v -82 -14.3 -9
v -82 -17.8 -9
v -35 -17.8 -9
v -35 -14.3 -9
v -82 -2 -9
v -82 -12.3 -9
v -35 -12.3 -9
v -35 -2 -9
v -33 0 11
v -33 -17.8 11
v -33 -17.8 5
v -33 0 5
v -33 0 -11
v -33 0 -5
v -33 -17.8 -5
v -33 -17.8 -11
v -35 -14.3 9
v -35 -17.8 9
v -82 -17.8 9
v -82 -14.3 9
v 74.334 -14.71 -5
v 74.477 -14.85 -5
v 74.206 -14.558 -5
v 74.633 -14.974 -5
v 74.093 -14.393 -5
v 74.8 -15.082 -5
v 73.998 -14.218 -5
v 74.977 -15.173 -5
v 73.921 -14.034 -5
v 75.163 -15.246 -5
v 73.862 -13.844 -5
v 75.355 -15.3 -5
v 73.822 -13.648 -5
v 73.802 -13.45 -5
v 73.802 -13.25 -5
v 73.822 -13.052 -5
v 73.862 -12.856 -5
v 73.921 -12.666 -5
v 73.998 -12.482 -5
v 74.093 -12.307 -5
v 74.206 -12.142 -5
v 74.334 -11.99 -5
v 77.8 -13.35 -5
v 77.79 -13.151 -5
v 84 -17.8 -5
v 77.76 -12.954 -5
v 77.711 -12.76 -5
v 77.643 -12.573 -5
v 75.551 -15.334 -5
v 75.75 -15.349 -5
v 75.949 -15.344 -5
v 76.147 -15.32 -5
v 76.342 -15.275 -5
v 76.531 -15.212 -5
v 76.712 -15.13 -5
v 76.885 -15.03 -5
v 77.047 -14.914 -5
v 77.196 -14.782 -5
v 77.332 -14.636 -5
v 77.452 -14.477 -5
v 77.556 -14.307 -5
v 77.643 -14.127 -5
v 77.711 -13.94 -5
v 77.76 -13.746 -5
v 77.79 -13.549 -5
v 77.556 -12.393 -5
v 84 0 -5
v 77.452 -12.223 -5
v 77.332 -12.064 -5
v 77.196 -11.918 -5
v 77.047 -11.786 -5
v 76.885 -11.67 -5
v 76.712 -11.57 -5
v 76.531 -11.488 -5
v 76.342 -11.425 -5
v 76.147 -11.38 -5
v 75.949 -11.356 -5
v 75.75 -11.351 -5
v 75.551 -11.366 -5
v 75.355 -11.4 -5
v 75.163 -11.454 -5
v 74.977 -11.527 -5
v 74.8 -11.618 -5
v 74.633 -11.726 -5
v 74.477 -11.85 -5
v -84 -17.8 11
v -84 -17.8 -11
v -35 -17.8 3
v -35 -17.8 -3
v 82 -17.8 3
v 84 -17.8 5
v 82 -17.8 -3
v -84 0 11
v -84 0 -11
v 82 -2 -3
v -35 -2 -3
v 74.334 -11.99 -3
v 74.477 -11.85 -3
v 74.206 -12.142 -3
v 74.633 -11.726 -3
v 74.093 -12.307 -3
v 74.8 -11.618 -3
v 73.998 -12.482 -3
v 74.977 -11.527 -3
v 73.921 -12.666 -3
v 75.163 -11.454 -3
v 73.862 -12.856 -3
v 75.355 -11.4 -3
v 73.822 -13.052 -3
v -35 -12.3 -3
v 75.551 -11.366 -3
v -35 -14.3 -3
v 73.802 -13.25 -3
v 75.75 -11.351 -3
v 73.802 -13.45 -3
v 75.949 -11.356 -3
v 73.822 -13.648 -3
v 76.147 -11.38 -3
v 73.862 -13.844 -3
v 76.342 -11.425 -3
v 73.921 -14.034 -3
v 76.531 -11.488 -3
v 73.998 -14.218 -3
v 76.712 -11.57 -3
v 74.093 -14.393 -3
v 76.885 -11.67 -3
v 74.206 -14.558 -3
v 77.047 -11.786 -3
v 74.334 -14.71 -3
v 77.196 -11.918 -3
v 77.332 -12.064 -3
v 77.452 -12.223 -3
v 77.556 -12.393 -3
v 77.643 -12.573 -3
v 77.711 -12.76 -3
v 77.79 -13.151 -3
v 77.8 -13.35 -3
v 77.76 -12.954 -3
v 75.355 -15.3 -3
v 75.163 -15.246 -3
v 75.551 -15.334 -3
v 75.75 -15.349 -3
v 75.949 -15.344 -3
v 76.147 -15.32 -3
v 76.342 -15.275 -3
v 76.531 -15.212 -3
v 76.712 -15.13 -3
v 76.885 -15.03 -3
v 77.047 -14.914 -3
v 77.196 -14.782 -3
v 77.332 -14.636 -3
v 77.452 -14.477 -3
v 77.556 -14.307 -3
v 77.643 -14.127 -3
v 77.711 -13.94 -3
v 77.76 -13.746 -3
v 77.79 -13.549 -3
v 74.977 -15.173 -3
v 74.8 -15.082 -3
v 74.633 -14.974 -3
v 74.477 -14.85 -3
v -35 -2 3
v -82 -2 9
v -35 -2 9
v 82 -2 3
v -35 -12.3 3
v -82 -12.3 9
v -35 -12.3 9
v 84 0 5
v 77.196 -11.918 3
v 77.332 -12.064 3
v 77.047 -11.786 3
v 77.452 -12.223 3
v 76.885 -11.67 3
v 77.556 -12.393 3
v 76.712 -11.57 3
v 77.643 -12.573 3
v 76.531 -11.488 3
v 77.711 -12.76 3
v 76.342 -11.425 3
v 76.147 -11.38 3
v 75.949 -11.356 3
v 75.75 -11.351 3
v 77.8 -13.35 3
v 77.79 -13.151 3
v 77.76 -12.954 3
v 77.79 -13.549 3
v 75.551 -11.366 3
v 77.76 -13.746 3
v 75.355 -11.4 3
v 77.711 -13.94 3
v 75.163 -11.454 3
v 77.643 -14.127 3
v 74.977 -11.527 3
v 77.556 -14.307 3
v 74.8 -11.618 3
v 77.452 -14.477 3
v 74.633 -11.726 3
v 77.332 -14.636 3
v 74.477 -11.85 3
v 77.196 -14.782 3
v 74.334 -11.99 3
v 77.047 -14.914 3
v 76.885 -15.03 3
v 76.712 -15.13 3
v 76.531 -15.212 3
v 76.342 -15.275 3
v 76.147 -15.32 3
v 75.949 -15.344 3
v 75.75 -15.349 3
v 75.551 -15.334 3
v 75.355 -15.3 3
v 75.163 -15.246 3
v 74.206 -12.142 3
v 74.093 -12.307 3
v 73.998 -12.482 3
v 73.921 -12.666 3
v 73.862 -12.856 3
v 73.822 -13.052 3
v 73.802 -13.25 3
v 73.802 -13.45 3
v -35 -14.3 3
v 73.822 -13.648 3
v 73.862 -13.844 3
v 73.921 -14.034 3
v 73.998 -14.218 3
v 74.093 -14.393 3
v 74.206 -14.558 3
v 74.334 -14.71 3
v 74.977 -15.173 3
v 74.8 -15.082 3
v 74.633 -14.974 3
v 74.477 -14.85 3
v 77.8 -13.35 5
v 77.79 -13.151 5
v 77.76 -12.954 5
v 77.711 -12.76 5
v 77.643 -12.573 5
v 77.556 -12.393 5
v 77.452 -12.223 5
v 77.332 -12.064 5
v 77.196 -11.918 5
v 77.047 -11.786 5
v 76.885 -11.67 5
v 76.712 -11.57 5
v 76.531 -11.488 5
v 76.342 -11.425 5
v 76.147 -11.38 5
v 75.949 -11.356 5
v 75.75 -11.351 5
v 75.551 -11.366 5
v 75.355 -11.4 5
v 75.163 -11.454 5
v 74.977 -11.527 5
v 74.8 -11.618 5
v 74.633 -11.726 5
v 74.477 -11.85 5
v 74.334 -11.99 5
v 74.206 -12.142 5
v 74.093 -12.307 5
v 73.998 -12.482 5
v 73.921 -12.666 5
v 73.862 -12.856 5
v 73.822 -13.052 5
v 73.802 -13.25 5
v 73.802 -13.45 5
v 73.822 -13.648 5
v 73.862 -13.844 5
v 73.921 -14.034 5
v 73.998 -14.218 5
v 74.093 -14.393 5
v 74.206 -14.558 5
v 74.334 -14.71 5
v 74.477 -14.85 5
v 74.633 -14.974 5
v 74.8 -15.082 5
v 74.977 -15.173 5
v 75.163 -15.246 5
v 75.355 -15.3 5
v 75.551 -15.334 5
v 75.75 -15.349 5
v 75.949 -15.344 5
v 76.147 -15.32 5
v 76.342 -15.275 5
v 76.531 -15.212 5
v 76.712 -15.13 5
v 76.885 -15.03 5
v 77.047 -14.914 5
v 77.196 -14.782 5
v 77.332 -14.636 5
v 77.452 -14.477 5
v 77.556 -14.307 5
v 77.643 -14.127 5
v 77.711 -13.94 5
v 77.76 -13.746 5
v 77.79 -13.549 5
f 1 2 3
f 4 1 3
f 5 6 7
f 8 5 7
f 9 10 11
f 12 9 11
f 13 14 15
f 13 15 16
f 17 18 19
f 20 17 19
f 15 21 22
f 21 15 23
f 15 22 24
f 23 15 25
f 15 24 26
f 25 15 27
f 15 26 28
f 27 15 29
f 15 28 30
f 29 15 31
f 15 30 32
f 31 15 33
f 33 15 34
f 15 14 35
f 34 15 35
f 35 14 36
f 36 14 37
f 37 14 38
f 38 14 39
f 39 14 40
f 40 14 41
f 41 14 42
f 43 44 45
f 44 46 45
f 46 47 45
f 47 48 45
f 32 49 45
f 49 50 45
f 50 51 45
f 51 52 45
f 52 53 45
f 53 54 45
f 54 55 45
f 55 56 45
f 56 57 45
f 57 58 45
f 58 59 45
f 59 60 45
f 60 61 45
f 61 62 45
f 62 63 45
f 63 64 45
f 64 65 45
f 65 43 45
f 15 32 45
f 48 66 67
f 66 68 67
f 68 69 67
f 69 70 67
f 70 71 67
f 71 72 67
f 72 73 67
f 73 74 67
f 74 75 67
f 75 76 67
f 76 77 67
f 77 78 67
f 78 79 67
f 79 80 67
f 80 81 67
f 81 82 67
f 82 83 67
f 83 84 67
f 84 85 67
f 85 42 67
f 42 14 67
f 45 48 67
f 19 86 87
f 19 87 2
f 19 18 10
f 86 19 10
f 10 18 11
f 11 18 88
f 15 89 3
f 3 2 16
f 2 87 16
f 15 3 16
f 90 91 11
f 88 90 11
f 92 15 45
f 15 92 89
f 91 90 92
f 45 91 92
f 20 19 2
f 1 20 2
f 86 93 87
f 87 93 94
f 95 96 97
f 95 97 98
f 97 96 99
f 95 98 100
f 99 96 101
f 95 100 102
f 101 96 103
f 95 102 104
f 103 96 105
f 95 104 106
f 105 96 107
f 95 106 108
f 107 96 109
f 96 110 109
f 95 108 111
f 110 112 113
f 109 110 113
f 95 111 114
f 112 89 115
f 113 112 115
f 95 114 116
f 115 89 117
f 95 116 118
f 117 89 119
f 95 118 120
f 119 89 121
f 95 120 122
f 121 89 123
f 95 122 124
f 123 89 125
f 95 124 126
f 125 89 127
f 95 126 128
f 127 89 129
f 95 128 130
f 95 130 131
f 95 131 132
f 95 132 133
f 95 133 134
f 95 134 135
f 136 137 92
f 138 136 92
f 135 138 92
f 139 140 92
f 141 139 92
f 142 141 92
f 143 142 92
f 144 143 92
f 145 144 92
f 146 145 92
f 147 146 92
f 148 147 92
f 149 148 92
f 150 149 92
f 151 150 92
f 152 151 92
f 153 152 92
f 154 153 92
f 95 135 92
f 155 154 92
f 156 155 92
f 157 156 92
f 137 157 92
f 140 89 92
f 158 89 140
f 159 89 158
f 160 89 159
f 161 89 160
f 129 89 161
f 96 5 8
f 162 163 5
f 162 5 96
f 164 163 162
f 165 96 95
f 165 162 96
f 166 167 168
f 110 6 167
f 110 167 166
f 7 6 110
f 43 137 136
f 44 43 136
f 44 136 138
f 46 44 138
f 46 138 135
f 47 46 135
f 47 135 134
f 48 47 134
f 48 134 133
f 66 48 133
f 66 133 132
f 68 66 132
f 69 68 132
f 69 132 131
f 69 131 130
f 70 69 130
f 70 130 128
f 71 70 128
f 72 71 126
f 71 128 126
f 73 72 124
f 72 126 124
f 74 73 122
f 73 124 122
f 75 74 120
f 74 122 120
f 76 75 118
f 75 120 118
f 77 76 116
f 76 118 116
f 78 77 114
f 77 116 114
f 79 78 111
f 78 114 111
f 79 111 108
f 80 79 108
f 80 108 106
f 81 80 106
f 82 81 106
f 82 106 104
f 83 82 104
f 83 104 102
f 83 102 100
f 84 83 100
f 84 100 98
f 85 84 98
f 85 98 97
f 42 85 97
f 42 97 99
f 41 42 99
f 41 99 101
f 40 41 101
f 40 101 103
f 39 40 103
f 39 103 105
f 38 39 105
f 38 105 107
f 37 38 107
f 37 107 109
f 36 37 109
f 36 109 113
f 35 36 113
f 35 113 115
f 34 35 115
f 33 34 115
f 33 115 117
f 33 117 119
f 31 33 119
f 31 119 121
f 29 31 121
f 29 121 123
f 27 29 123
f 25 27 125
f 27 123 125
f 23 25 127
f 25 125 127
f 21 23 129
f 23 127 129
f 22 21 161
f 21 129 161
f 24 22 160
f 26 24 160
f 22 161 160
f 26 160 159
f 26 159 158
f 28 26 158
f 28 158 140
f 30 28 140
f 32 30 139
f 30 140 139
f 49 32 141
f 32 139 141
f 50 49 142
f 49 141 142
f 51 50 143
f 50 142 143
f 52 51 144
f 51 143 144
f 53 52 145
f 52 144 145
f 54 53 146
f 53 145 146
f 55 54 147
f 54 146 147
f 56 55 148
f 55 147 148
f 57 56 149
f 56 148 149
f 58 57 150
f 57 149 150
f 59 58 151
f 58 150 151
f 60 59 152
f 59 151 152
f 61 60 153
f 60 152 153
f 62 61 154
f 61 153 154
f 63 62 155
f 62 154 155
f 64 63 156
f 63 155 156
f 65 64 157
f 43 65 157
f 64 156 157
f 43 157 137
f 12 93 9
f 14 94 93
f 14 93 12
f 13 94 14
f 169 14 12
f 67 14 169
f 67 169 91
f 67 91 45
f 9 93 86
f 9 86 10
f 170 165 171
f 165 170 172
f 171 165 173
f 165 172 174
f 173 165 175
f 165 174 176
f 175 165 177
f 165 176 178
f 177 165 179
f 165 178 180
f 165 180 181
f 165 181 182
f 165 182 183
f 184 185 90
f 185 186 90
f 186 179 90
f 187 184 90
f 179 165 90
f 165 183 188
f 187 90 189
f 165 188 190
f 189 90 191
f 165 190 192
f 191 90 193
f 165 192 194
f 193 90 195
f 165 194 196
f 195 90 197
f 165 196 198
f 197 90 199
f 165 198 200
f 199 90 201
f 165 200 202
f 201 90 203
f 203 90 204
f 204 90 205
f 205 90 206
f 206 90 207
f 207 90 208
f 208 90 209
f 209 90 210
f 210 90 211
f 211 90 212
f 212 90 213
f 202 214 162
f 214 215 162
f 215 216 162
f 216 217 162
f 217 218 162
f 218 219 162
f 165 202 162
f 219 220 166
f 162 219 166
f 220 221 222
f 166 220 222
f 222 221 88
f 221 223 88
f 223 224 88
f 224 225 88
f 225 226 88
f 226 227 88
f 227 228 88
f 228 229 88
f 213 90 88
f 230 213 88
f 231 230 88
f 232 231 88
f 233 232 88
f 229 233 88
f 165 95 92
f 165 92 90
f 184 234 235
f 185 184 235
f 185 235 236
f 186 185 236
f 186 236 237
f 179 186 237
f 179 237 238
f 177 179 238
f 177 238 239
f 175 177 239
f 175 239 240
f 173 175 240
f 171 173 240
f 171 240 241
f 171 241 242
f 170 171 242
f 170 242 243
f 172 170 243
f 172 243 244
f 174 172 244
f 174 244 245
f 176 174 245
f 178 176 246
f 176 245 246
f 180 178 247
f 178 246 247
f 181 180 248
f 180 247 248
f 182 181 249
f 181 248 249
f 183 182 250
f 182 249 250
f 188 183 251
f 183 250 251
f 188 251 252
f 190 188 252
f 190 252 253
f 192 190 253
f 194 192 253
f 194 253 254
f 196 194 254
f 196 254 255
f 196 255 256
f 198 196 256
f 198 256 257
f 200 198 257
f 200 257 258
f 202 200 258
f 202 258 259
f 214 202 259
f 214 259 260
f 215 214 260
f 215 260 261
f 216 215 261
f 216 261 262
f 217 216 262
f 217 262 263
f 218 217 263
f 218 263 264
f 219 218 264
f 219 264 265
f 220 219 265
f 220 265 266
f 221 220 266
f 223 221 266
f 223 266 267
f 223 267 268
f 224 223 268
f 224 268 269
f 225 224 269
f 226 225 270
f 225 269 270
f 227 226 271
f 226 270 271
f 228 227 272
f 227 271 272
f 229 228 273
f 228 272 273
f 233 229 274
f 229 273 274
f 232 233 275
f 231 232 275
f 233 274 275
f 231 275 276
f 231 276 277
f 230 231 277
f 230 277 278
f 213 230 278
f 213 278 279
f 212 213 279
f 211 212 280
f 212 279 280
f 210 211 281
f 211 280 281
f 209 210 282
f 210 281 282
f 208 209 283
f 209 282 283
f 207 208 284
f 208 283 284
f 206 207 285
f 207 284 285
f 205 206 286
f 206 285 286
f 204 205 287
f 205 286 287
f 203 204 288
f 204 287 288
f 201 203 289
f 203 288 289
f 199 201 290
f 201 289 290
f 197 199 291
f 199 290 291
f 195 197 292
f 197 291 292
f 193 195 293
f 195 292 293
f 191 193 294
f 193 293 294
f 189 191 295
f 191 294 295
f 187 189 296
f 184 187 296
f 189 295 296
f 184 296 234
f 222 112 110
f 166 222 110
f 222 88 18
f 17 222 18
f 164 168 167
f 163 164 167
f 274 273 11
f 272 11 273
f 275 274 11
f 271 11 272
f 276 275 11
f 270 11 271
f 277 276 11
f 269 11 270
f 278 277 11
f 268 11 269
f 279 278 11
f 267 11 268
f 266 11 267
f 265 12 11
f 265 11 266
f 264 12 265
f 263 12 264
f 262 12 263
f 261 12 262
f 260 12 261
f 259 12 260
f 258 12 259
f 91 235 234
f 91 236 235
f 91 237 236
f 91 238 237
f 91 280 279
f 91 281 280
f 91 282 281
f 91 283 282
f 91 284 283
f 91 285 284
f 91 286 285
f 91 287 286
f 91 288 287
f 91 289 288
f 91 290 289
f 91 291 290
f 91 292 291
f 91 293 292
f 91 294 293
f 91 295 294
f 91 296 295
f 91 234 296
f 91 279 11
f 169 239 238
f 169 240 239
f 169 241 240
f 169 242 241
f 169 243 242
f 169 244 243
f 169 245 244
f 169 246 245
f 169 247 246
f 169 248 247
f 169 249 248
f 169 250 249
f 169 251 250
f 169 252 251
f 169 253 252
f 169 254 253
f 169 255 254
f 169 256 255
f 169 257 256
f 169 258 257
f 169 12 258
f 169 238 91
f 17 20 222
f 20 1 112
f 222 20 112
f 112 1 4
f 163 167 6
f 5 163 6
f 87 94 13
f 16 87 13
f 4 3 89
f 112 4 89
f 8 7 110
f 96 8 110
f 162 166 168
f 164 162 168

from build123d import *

# Parameters (mm, degrees)
SKETCH1_W           = 168
SKETCH1_H           = 22
BOSS_EXTRUDE1_DEPTH = 17.8
SKETCH8_R           = 2
CUT_EXTRUDE4_DEPTH  = 22
CUT_EXTRUDE2_REACH  = 88.567
SKETCH5_W           = 117
SKETCH5_H           = 6
CUT_EXTRUDE3_DEPTH  = 15.8
BOSS_EXTRUDE3_REACH = 90.164
SKETCH7_W           = 47
SKETCH7_H           = 2


with BuildPart() as part:
    # Sketch1 → Boss-Extrude1 (new body)
    with BuildSketch(Plane(origin=(0, 0, 0), x_dir=(1, 0, 0), z_dir=(0, 1, 0))):
        Rectangle(SKETCH1_W, SKETCH1_H)
    extrude(amount=-BOSS_EXTRUDE1_DEPTH)

    # Sketch8 → Cut-Extrude4 (cut)
    with BuildSketch(Plane.XY.offset(11)):
        with Locations((75.8, -13.35)):
            Circle(SKETCH8_R)
    extrude(amount=-CUT_EXTRUDE4_DEPTH, mode=Mode.SUBTRACT)

    # Cut-Extrude2: up to this face of the body (flat: up to its plane)
    cut_extrude2_end = Plane(part.part.faces().sort_by_distance((0, -17.8, 0))[0])
    # Sketch5 → Cut-Extrude2 (cut, up to the picked face)
    with BuildSketch(Plane(origin=(0, 0, 0), x_dir=(1, 0, 0), z_dir=(0, 1, 0)), mode=Mode.PRIVATE) as cut_extrude2_sk1:
        with Locations((25.5, 8)):
            Rectangle(SKETCH5_W, SKETCH5_H)
    cut_extrude2_tool1 = split(extrude(cut_extrude2_sk1.sketch, amount=-CUT_EXTRUDE2_REACH, mode=Mode.PRIVATE), bisect_by=cut_extrude2_end, keep=Keep.BOTH, mode=Mode.PRIVATE)
    # Sketch5 → Cut-Extrude2 (cut, up to the picked face)
    with BuildSketch(Plane(origin=(0, 0, 0), x_dir=(1, 0, 0), z_dir=(0, 1, 0)), mode=Mode.PRIVATE) as cut_extrude2_sk2:
        with Locations((25.5, -8)):
            Rectangle(SKETCH5_W, SKETCH5_H)
    cut_extrude2_tool2 = split(extrude(cut_extrude2_sk2.sketch, amount=-CUT_EXTRUDE2_REACH, mode=Mode.PRIVATE), bisect_by=cut_extrude2_end, keep=Keep.BOTH, mode=Mode.PRIVATE)
    add(cut_extrude2_tool1.solids().sort_by(Axis((25.5, 0, -8), (0, -1, 0)))[0], mode=Mode.SUBTRACT)
    add(cut_extrude2_tool2.solids().sort_by(Axis((25.5, 0, 8), (0, -1, 0)))[0], mode=Mode.SUBTRACT)

    # Sketch6 → Cut-Extrude3 (cut)
    with BuildSketch(Plane.XZ.offset(17.8)):
        Polygon((-82, 9), (-82, -9), (-35, -9), (-35, -3), (82, -3), (82, 3), (-35, 3), (-35, 9), align=None)
    extrude(amount=-CUT_EXTRUDE3_DEPTH, mode=Mode.SUBTRACT)

    # Boss-Extrude3: up to this face of the body (flat: up to its plane)
    boss_extrude3_end = Plane(part.part.faces().sort_by_distance((-58.5, -9.9, 9))[0])
    # Sketch7 → Boss-Extrude3 (add, up to the picked face)
    with BuildSketch(Plane.XY.offset(-9), mode=Mode.PRIVATE) as boss_extrude3_sk1:
        with Locations((-58.5, -13.3)):
            Rectangle(SKETCH7_W, SKETCH7_H)
    boss_extrude3_tool1 = split(extrude(boss_extrude3_sk1.sketch, amount=BOSS_EXTRUDE3_REACH, mode=Mode.PRIVATE), bisect_by=boss_extrude3_end, keep=Keep.BOTH, mode=Mode.PRIVATE)
    add(boss_extrude3_tool1.solids().sort_by(Axis((-58.5, -13.3, -9), (0, 0, 1)))[0])


solid = part.part
